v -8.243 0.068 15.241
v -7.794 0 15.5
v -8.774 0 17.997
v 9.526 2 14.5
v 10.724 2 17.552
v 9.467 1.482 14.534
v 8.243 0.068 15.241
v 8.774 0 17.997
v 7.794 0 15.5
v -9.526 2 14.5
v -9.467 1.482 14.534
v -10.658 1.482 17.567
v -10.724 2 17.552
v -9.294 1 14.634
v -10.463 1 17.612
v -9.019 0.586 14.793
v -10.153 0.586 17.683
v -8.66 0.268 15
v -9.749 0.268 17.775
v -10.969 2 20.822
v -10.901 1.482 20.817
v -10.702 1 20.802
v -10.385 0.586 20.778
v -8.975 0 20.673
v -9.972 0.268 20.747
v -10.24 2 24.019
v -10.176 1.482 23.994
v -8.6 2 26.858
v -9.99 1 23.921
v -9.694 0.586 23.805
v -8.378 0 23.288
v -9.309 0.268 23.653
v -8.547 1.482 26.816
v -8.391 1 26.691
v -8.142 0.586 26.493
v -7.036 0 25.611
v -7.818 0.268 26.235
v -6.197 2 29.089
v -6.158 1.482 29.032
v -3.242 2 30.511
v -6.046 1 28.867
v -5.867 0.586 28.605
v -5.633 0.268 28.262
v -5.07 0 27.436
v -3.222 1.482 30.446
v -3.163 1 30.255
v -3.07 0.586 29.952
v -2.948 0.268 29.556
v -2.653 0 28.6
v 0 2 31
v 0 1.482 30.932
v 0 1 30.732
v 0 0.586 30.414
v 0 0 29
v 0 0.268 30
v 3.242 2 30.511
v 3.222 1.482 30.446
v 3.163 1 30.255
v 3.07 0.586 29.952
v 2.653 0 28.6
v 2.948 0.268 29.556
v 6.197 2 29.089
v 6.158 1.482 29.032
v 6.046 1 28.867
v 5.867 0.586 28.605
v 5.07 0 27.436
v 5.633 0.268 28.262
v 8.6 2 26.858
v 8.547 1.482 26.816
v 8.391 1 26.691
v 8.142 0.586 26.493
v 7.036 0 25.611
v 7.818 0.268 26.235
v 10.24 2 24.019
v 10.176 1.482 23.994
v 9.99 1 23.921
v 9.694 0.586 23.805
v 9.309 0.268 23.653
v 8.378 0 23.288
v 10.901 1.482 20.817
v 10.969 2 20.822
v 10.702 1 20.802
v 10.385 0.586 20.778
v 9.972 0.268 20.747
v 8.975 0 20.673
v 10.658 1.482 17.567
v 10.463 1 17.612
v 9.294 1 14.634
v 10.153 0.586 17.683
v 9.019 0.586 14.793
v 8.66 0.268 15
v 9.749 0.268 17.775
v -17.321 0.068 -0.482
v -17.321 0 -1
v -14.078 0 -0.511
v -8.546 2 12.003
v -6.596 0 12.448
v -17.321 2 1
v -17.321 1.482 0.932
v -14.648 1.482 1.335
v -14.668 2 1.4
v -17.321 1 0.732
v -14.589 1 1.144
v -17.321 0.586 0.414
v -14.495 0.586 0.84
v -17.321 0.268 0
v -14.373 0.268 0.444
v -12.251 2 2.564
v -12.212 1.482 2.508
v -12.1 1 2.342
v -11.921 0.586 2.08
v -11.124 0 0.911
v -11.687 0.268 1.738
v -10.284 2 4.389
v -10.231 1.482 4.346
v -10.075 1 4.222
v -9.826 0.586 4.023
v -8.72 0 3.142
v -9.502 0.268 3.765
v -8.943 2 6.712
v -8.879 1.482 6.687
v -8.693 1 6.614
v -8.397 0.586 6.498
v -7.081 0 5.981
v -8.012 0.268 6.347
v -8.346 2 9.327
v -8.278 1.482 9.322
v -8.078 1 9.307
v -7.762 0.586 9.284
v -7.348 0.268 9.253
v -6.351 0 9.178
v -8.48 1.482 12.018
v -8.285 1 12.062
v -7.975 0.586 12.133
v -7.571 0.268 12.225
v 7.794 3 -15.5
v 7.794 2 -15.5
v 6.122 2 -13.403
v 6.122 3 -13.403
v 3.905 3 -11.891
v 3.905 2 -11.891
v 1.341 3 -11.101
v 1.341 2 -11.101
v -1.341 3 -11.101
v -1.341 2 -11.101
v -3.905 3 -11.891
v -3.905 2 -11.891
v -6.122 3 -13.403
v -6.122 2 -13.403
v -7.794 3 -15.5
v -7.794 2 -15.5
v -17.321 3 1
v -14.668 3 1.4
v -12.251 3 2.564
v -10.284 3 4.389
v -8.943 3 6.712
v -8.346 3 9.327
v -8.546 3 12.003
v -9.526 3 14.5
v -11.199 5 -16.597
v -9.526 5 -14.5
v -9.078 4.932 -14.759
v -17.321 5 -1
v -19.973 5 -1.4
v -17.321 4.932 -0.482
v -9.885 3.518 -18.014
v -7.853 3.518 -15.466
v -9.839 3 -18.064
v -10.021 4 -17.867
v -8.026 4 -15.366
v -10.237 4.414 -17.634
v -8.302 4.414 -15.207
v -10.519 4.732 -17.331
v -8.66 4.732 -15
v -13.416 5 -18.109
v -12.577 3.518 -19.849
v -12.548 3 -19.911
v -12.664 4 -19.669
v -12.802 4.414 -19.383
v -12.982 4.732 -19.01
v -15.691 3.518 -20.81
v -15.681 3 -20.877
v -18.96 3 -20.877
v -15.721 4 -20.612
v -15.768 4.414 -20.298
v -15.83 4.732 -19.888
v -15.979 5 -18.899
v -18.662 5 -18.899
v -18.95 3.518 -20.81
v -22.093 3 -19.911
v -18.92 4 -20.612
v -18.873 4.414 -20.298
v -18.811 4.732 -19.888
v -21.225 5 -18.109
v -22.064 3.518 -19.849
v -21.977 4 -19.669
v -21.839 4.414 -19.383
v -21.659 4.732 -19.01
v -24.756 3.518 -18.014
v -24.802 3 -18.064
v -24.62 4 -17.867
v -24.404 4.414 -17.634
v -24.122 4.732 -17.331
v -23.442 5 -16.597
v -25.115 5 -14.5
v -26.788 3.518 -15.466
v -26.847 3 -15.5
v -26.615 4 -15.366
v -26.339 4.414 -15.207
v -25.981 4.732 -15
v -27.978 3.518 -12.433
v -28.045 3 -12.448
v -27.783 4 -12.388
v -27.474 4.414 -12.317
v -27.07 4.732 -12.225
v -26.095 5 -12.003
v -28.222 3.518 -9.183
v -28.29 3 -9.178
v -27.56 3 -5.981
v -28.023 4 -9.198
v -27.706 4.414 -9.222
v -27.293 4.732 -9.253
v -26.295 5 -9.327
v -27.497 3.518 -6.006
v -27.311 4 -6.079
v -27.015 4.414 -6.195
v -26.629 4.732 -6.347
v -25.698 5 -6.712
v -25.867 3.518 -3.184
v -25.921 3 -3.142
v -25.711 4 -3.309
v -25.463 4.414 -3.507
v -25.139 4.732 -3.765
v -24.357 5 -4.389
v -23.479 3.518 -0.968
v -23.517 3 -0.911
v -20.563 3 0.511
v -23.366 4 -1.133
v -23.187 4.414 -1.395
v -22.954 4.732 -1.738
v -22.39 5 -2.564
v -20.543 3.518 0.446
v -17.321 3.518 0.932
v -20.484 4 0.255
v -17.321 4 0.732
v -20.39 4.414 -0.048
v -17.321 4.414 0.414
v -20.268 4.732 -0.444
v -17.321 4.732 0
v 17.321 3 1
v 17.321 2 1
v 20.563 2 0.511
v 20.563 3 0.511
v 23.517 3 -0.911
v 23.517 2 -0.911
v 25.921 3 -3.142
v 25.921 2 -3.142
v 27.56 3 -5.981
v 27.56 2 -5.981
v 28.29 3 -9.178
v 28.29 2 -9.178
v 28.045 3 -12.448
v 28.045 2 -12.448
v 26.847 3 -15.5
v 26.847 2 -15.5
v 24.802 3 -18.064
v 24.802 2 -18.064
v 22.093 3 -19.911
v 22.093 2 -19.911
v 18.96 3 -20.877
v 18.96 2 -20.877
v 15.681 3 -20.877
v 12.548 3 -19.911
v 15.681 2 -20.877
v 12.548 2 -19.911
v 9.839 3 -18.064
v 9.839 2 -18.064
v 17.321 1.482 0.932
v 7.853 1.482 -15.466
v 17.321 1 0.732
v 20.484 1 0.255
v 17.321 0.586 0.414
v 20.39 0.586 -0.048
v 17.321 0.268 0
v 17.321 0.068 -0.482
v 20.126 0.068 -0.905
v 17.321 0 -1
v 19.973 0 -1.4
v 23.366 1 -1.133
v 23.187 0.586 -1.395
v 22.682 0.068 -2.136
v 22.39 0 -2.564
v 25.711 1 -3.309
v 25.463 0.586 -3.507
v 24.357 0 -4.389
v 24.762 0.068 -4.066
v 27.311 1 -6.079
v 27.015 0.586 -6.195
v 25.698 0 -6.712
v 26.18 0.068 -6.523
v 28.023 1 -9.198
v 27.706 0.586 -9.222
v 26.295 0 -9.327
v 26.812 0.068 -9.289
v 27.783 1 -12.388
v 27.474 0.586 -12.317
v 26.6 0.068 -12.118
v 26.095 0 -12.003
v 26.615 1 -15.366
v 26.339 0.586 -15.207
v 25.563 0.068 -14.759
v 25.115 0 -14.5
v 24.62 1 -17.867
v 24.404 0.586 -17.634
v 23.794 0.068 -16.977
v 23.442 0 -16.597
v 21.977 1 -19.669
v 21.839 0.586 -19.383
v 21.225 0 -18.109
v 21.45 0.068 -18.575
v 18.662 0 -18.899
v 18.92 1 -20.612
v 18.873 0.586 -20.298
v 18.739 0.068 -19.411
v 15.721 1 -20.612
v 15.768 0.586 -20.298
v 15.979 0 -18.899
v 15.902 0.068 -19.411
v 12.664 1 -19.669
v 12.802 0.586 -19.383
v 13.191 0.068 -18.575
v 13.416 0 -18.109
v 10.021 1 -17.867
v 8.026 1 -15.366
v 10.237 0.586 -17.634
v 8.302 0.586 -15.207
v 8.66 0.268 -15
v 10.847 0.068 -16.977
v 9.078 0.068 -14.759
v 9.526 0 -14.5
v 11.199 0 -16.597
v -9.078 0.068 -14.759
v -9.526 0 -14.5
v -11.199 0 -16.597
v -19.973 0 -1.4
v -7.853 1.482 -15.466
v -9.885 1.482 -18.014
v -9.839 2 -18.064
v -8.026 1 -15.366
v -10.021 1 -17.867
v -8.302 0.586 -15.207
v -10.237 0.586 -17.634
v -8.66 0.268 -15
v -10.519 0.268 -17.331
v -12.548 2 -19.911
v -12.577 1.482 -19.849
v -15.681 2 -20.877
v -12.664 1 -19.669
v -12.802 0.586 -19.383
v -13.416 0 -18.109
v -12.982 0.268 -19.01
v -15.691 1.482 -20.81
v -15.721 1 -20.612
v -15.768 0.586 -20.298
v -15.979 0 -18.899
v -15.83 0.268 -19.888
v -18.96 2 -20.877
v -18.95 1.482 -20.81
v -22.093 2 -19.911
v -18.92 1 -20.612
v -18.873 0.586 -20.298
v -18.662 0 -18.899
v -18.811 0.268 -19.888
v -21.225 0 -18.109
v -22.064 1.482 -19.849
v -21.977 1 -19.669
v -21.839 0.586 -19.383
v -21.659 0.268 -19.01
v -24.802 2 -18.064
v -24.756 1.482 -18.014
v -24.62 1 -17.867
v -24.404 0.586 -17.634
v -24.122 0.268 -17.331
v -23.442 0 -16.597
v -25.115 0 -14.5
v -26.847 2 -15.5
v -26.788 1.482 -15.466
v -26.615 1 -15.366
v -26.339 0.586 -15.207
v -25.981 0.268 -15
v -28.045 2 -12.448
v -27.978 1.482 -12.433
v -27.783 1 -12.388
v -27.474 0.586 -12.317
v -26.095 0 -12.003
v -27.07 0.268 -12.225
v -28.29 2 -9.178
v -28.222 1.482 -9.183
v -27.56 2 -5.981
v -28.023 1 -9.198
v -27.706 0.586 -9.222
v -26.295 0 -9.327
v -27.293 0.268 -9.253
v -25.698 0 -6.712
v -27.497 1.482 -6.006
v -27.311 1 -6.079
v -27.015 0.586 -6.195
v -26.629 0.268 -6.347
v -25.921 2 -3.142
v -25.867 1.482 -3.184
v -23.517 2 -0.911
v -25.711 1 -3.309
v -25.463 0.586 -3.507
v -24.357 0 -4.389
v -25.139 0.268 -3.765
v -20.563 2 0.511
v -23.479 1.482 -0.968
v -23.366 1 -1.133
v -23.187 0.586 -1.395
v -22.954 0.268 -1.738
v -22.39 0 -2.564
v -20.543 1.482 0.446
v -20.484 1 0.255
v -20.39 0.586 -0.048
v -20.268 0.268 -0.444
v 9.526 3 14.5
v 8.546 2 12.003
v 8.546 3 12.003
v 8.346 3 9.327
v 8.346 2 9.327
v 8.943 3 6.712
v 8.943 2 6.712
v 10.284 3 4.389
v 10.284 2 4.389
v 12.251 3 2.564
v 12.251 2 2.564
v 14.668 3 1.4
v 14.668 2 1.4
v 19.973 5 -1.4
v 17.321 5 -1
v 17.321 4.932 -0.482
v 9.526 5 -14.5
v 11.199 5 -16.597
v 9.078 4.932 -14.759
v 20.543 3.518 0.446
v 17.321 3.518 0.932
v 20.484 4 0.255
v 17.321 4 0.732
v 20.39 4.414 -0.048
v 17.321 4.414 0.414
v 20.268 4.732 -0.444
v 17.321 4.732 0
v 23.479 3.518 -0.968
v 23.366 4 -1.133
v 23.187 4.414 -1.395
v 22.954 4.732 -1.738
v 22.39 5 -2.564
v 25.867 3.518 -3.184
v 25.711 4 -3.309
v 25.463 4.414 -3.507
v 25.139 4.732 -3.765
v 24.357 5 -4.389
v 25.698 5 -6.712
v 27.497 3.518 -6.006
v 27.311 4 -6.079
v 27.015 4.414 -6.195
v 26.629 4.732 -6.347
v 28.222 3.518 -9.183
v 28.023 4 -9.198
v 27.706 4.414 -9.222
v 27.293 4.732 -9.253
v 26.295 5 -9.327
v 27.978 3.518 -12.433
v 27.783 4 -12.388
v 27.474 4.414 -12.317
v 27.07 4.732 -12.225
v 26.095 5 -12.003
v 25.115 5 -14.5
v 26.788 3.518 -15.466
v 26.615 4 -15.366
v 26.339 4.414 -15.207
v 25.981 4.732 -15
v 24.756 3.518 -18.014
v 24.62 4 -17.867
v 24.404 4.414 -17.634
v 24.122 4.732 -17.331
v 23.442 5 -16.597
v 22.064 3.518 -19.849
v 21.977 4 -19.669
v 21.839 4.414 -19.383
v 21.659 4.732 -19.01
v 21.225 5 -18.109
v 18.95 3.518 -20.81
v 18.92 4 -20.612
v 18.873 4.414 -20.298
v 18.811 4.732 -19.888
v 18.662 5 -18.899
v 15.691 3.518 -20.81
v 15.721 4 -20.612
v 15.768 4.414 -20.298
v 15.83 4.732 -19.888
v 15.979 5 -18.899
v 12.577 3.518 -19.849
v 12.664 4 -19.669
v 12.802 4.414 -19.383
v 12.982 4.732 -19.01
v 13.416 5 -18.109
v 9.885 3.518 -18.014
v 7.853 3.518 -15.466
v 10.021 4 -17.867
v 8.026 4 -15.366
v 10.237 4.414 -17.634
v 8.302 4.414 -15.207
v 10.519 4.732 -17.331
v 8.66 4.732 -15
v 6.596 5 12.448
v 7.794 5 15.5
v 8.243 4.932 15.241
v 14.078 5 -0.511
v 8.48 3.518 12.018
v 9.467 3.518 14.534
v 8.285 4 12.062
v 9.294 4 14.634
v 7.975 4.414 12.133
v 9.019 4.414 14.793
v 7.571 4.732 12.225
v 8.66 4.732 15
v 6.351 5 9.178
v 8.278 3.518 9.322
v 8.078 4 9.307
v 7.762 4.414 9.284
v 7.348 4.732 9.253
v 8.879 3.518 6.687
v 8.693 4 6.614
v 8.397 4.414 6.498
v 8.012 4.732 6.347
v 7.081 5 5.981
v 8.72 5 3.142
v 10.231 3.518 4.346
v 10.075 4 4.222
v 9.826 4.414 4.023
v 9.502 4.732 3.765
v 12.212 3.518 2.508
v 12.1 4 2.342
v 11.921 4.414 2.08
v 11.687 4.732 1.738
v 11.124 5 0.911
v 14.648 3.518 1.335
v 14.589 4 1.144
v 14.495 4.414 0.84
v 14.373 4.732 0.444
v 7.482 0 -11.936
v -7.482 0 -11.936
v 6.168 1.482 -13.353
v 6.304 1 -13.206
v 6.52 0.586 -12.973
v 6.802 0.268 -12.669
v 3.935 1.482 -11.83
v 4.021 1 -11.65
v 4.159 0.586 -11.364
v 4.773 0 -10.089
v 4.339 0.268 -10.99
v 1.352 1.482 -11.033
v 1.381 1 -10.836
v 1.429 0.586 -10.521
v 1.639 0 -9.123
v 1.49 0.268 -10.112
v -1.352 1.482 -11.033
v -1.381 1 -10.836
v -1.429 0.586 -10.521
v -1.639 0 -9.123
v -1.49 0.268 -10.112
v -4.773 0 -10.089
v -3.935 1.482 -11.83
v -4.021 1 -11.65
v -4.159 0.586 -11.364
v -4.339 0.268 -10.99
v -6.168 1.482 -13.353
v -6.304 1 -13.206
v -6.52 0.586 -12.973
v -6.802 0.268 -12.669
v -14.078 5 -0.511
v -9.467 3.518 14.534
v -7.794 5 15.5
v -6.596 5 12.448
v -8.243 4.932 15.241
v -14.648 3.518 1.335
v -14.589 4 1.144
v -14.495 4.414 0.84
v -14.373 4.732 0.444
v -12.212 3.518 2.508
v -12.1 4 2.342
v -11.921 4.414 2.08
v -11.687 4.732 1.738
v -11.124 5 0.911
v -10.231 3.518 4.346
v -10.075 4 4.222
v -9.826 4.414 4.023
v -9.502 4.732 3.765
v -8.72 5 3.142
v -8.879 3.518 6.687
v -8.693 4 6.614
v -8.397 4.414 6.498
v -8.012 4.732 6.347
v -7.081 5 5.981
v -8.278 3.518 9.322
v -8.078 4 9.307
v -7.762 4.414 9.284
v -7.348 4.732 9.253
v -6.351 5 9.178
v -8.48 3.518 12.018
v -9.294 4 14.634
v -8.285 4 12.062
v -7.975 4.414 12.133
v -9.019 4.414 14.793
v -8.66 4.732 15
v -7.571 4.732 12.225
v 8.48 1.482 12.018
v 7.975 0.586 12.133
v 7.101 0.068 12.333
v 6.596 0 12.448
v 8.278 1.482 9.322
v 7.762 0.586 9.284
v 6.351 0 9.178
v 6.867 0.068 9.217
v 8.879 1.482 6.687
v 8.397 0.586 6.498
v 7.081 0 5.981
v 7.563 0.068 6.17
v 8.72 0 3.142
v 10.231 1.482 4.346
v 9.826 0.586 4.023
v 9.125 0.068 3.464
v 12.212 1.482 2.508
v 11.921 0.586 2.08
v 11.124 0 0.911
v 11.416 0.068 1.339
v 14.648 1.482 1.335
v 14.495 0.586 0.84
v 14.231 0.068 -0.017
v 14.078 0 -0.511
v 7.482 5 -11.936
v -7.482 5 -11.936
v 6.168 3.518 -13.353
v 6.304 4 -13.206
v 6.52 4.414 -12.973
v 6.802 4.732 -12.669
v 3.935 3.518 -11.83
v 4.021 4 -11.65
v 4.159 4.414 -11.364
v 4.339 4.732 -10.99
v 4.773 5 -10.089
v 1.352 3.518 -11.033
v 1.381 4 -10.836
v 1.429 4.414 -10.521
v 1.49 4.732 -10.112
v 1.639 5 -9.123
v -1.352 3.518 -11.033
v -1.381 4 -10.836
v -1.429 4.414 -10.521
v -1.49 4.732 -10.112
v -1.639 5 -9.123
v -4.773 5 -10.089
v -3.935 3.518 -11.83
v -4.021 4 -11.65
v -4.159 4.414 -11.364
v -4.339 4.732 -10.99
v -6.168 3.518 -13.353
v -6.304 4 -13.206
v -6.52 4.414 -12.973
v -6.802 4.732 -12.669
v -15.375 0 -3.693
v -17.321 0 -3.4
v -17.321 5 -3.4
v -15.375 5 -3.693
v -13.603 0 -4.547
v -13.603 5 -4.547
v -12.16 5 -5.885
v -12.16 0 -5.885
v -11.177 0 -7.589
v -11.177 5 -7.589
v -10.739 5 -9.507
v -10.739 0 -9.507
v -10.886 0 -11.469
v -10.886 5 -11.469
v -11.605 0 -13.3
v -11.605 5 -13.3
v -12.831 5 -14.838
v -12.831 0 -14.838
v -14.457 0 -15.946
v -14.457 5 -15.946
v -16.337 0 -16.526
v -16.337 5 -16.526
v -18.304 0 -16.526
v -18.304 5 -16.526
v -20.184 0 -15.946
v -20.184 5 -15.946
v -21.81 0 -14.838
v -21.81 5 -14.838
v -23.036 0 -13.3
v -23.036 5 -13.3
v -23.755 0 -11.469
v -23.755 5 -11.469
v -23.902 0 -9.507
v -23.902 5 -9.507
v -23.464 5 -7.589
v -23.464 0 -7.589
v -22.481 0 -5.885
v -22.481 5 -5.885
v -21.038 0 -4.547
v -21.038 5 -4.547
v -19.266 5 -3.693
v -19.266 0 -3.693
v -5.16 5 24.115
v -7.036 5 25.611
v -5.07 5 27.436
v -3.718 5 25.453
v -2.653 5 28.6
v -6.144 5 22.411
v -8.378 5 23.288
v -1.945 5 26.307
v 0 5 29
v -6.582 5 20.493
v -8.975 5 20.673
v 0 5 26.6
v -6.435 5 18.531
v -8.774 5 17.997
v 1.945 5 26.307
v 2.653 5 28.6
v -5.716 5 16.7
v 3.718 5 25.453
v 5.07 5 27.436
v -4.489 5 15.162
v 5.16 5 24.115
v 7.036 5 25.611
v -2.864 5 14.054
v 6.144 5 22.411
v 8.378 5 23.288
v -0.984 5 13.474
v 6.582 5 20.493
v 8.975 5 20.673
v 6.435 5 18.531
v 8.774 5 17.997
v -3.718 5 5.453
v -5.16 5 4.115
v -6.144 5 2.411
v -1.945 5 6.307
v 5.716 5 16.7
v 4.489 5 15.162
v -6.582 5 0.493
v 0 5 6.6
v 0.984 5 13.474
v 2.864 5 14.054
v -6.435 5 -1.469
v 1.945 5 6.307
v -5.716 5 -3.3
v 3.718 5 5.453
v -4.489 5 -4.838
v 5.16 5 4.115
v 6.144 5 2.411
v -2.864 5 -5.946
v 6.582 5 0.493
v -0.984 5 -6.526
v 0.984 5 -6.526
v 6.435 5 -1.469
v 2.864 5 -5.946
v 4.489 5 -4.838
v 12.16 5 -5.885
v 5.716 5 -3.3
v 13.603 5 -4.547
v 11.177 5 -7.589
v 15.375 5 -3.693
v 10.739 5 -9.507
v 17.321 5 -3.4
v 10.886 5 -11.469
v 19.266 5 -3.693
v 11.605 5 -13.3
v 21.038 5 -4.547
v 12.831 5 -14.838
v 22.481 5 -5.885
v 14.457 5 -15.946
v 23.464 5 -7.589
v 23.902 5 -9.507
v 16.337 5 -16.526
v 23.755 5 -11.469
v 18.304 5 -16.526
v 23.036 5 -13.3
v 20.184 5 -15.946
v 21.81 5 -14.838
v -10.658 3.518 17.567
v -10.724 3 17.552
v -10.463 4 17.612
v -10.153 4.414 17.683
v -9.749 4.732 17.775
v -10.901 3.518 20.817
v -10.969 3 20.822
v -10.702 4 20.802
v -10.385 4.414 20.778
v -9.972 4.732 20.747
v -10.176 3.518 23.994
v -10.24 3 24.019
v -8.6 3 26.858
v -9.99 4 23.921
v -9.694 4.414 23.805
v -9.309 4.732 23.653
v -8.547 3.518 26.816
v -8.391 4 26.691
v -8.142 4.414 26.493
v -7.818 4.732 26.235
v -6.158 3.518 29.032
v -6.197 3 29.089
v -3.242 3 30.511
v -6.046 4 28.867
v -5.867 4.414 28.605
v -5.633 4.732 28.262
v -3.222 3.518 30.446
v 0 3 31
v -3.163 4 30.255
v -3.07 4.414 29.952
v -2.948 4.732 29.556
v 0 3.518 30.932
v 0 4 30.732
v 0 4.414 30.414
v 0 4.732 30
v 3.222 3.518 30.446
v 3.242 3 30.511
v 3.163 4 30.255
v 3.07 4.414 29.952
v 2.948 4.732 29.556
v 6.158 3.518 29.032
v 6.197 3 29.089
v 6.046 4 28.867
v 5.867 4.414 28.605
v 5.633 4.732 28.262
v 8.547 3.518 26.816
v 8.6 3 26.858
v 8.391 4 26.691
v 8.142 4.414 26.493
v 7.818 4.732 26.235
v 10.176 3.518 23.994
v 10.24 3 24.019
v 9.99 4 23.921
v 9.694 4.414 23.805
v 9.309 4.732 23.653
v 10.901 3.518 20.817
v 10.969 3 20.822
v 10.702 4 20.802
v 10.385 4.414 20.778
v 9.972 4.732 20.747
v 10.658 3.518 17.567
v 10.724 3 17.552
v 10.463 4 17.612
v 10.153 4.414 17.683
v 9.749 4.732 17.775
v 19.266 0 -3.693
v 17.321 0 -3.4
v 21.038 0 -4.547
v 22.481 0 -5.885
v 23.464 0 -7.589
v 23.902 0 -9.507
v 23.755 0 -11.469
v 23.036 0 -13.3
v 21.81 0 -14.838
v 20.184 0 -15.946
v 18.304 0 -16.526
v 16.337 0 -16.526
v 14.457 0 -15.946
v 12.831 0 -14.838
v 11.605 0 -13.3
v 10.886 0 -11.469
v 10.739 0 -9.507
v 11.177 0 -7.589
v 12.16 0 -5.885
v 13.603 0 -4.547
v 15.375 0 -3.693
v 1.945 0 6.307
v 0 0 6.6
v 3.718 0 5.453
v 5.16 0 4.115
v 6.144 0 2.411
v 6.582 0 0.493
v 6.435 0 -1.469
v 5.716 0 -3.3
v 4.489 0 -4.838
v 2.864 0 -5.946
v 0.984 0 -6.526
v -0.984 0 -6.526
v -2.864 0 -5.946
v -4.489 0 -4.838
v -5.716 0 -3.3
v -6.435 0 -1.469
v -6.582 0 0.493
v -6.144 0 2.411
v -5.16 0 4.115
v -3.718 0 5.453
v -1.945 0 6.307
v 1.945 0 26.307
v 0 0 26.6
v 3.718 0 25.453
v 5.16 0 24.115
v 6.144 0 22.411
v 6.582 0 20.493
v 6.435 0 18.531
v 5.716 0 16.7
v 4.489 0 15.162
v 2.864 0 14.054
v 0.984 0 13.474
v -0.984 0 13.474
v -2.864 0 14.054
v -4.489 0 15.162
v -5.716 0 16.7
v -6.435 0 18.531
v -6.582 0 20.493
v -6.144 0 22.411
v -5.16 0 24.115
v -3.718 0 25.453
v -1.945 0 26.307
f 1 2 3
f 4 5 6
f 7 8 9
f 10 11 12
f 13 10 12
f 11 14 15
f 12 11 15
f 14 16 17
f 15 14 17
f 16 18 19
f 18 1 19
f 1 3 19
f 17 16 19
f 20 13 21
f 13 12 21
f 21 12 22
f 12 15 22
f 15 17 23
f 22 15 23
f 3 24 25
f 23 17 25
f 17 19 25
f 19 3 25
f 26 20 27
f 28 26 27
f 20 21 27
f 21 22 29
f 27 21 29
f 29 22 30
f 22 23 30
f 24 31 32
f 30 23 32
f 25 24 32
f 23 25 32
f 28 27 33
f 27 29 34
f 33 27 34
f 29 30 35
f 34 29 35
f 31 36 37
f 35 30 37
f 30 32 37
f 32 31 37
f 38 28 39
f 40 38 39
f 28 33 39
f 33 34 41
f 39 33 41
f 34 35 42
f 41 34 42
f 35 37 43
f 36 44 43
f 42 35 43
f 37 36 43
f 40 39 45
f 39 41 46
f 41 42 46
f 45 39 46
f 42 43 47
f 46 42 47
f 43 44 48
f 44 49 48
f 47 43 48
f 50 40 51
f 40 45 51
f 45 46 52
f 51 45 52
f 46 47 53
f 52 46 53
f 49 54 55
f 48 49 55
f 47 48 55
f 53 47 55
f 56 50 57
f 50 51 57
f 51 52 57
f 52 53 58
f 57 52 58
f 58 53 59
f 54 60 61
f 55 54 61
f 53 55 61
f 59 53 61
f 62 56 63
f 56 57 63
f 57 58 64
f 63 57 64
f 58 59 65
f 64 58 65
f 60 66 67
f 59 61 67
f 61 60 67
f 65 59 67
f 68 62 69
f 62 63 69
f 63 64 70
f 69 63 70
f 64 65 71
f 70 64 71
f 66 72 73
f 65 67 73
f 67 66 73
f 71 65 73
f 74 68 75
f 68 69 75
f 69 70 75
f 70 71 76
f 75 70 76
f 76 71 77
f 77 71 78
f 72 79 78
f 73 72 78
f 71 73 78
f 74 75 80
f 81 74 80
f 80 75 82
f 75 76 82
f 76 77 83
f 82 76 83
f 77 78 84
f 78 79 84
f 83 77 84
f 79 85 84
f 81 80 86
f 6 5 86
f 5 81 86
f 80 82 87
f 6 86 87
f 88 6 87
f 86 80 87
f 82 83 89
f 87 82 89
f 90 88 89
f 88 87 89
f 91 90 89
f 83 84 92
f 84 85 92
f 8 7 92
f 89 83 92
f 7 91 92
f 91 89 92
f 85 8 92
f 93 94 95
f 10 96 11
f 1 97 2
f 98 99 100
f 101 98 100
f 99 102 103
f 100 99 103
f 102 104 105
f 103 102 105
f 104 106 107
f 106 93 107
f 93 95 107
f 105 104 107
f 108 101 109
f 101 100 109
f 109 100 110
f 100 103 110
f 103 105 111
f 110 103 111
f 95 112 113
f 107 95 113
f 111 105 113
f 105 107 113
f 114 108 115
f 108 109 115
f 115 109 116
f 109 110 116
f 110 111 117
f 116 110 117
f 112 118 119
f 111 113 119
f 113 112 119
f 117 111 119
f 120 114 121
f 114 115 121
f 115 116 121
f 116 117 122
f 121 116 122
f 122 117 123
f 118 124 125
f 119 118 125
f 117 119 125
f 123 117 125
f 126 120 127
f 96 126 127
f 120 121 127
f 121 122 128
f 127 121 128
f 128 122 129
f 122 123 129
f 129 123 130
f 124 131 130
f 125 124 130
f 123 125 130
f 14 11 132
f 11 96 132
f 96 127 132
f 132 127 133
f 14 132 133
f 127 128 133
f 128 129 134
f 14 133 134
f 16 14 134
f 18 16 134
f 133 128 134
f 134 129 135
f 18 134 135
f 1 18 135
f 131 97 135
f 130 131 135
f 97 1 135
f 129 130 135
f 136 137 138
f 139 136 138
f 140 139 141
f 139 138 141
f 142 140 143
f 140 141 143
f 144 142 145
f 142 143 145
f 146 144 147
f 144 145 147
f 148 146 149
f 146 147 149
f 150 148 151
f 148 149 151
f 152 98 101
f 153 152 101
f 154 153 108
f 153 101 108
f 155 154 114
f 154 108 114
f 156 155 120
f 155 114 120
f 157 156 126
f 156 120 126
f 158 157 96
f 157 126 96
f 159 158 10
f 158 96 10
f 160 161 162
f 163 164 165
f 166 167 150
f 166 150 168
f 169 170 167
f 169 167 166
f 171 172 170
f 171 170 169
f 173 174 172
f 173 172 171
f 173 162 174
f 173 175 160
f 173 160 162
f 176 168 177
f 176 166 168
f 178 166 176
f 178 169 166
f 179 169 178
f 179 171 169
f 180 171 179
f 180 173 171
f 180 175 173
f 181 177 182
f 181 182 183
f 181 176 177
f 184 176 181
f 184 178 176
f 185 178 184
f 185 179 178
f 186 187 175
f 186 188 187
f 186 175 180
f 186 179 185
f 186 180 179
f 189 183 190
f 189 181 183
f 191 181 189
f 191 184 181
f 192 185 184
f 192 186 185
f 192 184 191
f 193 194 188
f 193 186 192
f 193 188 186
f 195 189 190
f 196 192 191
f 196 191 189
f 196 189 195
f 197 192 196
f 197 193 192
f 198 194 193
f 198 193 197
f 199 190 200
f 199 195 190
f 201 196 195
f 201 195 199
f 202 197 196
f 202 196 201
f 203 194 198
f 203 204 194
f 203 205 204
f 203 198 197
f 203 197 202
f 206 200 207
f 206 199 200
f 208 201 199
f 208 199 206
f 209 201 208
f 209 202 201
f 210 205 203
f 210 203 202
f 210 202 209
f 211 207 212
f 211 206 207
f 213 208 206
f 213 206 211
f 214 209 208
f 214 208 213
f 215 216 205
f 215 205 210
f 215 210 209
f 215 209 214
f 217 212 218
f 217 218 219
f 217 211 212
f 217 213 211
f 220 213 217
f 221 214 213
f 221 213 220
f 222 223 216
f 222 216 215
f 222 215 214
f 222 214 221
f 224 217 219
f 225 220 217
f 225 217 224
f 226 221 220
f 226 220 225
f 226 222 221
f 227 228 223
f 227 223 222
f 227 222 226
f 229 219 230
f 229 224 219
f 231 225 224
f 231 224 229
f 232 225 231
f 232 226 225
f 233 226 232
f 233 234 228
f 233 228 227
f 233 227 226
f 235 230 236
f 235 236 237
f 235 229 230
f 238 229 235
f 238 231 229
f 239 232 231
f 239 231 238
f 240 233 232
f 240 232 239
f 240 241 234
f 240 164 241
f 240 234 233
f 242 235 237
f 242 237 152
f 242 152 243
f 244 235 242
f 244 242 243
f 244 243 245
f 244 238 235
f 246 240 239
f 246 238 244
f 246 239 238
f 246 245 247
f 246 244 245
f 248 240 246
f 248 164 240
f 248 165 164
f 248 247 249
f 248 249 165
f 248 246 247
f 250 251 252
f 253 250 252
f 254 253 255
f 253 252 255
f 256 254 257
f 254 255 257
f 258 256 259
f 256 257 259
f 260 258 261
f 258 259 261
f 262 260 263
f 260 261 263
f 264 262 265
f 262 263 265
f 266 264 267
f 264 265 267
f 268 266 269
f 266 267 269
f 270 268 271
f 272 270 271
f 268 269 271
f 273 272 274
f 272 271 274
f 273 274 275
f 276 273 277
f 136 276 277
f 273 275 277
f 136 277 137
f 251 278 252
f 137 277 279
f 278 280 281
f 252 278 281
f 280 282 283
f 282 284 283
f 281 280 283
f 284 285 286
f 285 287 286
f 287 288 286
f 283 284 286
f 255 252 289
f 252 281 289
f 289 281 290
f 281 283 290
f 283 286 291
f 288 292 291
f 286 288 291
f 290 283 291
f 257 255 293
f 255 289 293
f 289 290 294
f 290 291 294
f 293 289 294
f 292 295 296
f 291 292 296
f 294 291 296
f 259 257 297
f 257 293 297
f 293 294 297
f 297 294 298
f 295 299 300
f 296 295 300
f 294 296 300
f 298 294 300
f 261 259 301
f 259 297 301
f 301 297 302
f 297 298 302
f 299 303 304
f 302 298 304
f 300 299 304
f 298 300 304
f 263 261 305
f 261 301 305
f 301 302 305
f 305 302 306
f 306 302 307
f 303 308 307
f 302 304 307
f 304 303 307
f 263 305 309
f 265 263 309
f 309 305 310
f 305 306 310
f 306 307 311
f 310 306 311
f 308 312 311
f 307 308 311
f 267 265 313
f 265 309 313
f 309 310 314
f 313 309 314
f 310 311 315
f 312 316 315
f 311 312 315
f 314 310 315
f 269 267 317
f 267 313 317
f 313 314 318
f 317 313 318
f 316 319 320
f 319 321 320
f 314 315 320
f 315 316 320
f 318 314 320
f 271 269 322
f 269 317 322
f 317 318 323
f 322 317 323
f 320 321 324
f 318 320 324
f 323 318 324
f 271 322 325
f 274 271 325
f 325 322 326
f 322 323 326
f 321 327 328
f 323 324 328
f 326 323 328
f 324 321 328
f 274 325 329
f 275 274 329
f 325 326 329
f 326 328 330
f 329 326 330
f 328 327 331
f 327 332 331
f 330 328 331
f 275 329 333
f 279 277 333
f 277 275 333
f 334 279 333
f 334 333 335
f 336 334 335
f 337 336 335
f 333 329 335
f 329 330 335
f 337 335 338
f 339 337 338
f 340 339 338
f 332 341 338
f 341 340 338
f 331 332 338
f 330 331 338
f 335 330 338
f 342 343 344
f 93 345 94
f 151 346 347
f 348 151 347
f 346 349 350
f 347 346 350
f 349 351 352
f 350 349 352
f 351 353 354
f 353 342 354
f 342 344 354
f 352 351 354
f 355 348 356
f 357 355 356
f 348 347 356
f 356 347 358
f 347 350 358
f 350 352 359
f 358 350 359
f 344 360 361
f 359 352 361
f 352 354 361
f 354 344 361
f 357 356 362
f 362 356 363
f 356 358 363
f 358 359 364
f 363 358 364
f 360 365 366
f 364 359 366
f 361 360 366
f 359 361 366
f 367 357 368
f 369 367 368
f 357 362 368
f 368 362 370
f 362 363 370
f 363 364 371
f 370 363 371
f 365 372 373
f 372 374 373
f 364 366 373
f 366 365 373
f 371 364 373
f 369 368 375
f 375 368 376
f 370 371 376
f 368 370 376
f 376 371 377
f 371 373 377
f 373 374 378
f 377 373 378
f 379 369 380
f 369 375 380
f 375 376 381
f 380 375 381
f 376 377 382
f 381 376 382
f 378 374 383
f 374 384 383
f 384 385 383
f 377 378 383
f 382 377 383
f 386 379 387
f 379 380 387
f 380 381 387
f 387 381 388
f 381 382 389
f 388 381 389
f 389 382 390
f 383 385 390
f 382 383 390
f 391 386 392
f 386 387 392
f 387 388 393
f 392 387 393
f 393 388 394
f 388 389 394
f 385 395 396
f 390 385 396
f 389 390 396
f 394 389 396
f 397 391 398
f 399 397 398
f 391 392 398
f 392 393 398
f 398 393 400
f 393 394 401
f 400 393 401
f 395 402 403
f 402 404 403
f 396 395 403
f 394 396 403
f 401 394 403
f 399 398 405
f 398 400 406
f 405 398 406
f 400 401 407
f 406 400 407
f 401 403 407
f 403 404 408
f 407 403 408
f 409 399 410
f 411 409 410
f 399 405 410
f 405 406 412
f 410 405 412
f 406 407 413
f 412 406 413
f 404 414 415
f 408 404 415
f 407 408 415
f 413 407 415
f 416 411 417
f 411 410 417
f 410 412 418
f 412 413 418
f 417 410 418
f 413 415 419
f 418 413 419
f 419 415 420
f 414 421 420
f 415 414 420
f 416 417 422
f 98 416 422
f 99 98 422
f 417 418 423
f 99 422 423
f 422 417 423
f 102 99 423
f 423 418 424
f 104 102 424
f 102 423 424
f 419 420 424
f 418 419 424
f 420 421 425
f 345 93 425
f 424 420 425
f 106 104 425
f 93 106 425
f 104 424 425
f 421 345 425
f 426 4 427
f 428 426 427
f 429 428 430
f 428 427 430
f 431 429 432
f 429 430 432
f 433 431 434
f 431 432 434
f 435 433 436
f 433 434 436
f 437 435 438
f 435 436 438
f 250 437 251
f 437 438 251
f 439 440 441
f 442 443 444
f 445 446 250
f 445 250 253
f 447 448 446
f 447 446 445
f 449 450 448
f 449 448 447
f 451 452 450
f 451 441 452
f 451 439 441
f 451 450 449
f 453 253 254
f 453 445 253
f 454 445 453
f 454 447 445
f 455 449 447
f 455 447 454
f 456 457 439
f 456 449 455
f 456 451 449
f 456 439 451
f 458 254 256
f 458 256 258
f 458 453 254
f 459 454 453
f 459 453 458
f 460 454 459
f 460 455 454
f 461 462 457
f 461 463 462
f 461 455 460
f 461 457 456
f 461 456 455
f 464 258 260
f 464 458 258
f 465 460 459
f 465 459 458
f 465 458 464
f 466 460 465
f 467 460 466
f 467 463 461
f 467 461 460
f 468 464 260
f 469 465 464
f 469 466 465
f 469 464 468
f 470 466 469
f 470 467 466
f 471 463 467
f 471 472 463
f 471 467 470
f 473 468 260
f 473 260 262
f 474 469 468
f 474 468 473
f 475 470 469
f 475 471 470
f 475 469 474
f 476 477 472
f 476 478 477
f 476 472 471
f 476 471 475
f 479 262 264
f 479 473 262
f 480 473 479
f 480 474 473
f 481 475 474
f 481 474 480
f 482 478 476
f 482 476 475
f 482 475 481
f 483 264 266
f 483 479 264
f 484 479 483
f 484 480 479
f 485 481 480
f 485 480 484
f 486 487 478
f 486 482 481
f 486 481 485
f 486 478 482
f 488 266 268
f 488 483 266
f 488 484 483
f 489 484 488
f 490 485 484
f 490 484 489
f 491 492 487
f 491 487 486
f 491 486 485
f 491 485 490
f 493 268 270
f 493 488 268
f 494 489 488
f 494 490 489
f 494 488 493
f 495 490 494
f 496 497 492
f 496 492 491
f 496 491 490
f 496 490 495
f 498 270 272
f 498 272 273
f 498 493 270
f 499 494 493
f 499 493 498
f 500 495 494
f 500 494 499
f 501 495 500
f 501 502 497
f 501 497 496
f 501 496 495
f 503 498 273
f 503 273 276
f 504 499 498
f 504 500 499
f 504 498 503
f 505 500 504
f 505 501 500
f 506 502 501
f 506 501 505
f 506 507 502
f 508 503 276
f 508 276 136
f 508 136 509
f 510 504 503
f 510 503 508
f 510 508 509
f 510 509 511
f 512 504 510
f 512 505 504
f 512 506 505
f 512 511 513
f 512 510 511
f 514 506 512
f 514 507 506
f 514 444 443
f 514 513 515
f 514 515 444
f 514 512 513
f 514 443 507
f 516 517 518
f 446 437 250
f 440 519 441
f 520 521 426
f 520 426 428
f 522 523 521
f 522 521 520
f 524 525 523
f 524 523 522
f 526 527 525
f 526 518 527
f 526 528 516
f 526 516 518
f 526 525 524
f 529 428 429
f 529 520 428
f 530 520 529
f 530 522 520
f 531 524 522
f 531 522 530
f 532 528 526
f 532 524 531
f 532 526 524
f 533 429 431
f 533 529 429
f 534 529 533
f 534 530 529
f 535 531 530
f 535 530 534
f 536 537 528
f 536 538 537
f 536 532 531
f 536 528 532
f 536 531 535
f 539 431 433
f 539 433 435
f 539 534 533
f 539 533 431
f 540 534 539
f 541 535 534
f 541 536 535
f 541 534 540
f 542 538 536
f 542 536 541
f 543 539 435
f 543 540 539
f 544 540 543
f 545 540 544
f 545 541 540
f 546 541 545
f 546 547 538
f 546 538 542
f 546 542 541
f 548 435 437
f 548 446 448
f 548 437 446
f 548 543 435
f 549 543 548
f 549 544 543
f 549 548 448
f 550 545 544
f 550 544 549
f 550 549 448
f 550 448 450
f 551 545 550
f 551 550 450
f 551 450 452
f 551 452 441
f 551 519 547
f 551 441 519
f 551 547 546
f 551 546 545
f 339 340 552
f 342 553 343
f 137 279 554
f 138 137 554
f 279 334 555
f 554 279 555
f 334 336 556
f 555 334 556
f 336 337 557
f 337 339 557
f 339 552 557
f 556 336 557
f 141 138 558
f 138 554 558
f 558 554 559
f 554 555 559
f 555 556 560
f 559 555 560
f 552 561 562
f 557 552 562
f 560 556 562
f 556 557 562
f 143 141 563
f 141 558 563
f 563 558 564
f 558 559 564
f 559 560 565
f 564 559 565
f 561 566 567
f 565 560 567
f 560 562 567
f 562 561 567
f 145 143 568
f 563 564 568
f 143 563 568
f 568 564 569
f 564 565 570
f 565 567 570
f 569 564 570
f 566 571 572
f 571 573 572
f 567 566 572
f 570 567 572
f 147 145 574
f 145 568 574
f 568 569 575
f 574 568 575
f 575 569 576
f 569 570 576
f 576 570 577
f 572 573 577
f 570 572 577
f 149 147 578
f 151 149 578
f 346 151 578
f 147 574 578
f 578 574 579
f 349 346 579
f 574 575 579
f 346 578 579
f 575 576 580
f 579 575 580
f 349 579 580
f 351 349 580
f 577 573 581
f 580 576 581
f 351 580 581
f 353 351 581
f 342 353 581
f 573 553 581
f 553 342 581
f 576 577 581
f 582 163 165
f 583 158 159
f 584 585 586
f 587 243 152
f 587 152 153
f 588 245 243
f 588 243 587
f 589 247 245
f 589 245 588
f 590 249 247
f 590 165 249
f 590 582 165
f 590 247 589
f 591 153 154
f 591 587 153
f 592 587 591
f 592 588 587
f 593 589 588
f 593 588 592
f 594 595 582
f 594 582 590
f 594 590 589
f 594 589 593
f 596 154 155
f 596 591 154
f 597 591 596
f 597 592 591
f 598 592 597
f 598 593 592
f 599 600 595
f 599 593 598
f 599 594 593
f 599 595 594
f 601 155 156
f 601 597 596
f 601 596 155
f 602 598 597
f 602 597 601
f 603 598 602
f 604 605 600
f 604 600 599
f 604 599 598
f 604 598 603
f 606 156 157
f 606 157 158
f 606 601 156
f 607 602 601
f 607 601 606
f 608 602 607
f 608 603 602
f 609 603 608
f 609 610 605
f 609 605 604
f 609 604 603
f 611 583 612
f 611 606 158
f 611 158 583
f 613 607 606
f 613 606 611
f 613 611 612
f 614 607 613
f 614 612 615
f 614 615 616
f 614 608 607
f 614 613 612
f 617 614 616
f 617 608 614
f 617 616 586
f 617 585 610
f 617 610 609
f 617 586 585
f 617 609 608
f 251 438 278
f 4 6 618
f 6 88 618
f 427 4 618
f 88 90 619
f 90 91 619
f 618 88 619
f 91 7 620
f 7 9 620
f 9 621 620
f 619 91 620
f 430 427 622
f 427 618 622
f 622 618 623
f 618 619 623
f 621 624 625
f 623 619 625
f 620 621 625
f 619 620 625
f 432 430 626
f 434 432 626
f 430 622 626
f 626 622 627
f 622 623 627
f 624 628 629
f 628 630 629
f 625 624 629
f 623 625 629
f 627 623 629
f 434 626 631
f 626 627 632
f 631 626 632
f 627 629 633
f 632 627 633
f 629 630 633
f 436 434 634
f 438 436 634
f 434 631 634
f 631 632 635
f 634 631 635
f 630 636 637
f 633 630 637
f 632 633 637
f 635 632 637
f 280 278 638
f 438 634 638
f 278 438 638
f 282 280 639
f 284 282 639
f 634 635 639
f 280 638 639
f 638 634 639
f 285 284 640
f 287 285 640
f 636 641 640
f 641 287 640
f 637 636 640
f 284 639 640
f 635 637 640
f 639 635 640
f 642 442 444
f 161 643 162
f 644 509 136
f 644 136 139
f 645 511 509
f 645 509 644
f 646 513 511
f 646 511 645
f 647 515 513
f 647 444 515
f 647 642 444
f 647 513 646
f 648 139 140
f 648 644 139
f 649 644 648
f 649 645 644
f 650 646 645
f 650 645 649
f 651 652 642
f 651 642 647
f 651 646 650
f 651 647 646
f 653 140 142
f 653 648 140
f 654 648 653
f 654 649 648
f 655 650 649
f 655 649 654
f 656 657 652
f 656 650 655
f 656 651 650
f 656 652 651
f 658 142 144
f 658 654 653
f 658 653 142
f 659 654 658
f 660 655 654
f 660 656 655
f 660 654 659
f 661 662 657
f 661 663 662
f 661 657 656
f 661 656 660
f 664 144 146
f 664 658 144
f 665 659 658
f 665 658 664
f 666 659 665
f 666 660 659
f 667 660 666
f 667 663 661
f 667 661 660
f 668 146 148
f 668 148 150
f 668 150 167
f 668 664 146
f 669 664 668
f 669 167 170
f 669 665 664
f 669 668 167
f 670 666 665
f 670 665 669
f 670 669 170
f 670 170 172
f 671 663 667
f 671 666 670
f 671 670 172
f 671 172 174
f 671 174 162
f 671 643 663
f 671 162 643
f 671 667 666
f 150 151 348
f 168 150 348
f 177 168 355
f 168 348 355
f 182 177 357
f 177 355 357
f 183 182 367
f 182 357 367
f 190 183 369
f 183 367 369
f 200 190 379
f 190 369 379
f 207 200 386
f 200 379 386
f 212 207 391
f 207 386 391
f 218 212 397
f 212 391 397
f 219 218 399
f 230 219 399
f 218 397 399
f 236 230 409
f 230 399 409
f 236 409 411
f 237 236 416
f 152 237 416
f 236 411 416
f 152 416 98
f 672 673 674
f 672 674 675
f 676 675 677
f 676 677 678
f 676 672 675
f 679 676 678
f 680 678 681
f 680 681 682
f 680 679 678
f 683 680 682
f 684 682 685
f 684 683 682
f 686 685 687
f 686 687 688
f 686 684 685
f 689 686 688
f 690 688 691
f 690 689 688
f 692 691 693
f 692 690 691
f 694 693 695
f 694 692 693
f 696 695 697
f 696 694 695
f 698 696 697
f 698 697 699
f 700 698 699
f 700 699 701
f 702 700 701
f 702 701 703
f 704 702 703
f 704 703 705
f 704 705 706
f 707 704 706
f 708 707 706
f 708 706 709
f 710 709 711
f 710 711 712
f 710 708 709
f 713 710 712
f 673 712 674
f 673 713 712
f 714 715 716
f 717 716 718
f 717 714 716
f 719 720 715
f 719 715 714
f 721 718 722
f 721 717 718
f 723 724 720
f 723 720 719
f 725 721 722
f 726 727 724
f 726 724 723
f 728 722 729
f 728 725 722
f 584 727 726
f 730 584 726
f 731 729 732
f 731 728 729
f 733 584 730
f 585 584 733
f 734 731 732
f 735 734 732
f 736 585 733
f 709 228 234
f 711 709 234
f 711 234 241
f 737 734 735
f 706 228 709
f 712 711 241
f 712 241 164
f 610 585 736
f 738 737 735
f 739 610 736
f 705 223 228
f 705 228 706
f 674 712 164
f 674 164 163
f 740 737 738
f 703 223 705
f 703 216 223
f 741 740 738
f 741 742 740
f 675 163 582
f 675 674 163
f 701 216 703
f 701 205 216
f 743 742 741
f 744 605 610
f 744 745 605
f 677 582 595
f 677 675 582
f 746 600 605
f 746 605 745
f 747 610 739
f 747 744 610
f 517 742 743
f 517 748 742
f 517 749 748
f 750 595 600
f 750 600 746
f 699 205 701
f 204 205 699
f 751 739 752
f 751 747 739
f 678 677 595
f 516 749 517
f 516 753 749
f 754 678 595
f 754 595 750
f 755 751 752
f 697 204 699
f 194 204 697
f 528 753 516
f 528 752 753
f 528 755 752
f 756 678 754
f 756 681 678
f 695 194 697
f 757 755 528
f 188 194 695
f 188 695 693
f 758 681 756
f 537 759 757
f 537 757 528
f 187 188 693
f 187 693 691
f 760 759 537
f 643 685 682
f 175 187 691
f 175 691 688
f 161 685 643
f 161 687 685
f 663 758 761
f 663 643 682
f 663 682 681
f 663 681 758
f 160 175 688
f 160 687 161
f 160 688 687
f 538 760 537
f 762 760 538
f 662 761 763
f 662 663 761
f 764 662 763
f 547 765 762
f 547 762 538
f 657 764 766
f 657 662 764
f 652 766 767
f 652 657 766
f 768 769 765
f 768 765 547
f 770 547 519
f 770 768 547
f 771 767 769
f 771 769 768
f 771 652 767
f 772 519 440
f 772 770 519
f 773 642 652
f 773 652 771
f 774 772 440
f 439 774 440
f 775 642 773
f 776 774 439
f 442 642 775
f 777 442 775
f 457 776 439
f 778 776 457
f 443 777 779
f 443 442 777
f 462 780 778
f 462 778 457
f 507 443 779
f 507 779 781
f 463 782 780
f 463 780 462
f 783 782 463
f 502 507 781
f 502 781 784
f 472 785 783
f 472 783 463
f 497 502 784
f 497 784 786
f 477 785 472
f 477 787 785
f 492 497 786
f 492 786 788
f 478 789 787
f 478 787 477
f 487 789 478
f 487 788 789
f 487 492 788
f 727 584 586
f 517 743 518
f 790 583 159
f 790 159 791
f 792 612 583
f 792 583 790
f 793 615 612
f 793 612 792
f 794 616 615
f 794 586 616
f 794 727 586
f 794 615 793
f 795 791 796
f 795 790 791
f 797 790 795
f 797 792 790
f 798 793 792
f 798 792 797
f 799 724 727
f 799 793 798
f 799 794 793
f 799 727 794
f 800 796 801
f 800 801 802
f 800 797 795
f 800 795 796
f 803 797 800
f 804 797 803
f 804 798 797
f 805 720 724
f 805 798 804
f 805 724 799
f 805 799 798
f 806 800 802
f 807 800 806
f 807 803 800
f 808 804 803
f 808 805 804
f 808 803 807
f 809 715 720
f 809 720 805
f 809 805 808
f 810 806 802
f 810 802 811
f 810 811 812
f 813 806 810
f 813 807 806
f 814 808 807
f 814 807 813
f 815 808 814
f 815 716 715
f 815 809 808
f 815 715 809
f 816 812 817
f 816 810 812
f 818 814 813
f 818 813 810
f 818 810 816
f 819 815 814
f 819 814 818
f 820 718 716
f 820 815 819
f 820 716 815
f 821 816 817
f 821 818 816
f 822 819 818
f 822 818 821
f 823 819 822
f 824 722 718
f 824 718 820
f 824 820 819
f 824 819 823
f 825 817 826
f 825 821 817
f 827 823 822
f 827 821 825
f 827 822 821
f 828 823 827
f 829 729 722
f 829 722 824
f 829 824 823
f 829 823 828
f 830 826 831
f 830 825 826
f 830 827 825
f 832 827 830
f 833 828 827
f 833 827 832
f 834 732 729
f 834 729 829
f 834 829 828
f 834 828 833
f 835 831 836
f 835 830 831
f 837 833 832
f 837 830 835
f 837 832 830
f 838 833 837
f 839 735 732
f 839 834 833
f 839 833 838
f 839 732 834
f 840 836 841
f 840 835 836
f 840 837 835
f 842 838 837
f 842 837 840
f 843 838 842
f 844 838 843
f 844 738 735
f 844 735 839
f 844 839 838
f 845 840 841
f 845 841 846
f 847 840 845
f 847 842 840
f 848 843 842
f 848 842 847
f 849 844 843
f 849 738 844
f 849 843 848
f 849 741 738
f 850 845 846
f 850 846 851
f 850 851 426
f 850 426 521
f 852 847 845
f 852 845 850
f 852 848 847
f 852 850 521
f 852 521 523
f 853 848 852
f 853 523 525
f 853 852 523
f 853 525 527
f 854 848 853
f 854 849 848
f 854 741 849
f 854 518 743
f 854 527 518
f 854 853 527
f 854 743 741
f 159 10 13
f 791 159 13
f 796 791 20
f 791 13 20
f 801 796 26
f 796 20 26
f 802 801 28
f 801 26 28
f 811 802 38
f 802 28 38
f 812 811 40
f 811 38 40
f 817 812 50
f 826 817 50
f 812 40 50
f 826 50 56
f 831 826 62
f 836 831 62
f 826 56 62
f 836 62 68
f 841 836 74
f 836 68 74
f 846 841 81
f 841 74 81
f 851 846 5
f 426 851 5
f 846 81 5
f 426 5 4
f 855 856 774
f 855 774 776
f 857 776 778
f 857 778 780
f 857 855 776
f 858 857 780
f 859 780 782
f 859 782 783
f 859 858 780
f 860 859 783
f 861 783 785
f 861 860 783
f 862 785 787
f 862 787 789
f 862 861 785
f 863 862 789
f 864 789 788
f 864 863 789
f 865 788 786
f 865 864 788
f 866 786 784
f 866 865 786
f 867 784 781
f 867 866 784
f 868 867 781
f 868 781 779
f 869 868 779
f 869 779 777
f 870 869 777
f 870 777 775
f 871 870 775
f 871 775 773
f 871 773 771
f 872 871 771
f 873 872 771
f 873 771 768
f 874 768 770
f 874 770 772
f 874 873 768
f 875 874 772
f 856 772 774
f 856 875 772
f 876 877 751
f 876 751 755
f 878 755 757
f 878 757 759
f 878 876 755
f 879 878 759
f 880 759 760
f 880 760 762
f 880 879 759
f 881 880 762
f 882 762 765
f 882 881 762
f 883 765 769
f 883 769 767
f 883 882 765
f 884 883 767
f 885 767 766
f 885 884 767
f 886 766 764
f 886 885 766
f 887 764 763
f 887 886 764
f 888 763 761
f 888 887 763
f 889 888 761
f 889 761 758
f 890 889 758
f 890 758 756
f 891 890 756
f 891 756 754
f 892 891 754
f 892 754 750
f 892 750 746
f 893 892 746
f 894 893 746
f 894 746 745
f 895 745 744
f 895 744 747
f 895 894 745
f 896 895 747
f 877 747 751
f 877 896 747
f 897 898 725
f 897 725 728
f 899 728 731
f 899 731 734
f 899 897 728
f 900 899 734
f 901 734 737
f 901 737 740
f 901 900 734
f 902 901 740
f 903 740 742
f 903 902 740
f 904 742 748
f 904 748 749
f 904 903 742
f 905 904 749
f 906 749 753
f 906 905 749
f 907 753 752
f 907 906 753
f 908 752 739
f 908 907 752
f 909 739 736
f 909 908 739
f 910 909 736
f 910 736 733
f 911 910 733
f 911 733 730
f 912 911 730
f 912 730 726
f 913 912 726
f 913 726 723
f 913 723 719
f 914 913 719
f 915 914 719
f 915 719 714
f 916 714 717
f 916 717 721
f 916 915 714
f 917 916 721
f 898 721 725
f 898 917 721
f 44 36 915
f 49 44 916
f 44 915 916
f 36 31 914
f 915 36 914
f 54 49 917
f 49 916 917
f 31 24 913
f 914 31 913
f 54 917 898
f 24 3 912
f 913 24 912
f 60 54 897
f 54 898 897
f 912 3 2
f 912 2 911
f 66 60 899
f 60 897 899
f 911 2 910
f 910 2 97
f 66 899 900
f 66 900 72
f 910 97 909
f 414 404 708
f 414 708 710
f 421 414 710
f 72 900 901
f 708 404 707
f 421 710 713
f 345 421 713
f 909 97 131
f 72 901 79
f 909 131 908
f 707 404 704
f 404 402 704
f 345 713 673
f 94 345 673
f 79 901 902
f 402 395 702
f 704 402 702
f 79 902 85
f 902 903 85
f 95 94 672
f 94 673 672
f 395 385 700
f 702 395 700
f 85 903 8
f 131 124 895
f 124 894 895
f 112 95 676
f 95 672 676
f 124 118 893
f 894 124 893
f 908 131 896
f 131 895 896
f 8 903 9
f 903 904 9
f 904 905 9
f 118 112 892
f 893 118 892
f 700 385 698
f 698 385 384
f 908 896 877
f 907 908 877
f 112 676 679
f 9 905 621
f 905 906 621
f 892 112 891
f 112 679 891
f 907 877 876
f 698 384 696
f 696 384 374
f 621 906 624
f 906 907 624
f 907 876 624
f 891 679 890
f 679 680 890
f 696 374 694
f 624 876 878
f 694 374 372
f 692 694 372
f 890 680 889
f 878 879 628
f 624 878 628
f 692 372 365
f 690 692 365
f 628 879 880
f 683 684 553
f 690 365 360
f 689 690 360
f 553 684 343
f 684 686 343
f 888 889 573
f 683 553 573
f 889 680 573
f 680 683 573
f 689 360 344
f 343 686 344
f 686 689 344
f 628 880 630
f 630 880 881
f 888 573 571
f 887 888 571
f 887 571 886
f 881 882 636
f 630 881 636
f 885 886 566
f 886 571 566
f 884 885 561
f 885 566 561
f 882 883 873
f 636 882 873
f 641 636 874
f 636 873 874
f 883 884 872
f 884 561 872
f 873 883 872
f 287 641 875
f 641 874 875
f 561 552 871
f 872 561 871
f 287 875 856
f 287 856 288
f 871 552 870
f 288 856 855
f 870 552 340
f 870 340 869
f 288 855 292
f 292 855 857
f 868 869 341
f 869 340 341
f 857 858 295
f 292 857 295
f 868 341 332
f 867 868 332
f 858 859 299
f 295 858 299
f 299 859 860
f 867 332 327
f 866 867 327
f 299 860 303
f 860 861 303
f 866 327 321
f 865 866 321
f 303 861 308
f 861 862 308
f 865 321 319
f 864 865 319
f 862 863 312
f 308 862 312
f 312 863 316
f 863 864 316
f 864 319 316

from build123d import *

# Parameters (mm, degrees)
CROQUIS1_R              = 6.6
SALIENTE_EXTRUIR1_DEPTH = 5
REDONDEO1_R             = 2


with BuildPart() as part:
    # Croquis1 → Saliente-Extruir1 (new body)
    with BuildSketch(Plane(origin=(0, 0, 0), x_dir=(1, 0, 0), z_dir=(0, 1, 0))):
        with BuildLine():
            ThreePointArc((17.320508076, -1), (26.846787517, 15.5), (7.794228634, 15.5))
            ThreePointArc((7.794228634, 15.5), (0, 11), (-7.794228634, 15.5))
            ThreePointArc((-7.794228634, 15.5), (-26.846787517, 15.5), (-17.320508076, -1))
            ThreePointArc((-17.320508076, -1), (-9.526279442, -5.5), (-9.526279442, -14.5))
            ThreePointArc((-9.526279442, -14.5), (0, -31), (9.526279442, -14.5))
            ThreePointArc((9.526279442, -14.5), (9.526279442, -5.5), (17.320508076, -1))
        make_face()
        with Locations(Location((0, 0, 0), (0, 0, 270))):
            Circle(CROQUIS1_R, mode=Mode.SUBTRACT)
        with Locations(Location((0, -20, 0), (0, 0, 270))):
            Circle(CROQUIS1_R, mode=Mode.SUBTRACT)
        with Locations(Location((17.320508076, 10, 0), (0, 0, 270))):
            Circle(CROQUIS1_R, mode=Mode.SUBTRACT)
        with Locations(Location((-17.320508076, 10, 0), (0, 0, 270))):
            Circle(CROQUIS1_R, mode=Mode.SUBTRACT)
    extrude(amount=SALIENTE_EXTRUIR1_DEPTH)

    # Redondeo1
    redondeo1_edges = [part.edges().sort_by_distance(p)[0] for p in [
        (-9.526279442, 5, 5.5),
        (0, 5, 31),
        (9.526279442, 5, 5.5),
        (26.846787517, 5, -15.5),
        (0, 5, -11),
        (26.846787517, 0, -15.5),
        (9.526279442, 0, 5.5),
        (0, 0, 31),
        (-26.846787517, 5, -15.5),
        (-9.526279442, 0, 5.5),
        (-26.846787517, 0, -15.5),
        (0, 0, -11),
    ]]
    fillet(redondeo1_edges, radius=REDONDEO1_R)


solid = part.part
